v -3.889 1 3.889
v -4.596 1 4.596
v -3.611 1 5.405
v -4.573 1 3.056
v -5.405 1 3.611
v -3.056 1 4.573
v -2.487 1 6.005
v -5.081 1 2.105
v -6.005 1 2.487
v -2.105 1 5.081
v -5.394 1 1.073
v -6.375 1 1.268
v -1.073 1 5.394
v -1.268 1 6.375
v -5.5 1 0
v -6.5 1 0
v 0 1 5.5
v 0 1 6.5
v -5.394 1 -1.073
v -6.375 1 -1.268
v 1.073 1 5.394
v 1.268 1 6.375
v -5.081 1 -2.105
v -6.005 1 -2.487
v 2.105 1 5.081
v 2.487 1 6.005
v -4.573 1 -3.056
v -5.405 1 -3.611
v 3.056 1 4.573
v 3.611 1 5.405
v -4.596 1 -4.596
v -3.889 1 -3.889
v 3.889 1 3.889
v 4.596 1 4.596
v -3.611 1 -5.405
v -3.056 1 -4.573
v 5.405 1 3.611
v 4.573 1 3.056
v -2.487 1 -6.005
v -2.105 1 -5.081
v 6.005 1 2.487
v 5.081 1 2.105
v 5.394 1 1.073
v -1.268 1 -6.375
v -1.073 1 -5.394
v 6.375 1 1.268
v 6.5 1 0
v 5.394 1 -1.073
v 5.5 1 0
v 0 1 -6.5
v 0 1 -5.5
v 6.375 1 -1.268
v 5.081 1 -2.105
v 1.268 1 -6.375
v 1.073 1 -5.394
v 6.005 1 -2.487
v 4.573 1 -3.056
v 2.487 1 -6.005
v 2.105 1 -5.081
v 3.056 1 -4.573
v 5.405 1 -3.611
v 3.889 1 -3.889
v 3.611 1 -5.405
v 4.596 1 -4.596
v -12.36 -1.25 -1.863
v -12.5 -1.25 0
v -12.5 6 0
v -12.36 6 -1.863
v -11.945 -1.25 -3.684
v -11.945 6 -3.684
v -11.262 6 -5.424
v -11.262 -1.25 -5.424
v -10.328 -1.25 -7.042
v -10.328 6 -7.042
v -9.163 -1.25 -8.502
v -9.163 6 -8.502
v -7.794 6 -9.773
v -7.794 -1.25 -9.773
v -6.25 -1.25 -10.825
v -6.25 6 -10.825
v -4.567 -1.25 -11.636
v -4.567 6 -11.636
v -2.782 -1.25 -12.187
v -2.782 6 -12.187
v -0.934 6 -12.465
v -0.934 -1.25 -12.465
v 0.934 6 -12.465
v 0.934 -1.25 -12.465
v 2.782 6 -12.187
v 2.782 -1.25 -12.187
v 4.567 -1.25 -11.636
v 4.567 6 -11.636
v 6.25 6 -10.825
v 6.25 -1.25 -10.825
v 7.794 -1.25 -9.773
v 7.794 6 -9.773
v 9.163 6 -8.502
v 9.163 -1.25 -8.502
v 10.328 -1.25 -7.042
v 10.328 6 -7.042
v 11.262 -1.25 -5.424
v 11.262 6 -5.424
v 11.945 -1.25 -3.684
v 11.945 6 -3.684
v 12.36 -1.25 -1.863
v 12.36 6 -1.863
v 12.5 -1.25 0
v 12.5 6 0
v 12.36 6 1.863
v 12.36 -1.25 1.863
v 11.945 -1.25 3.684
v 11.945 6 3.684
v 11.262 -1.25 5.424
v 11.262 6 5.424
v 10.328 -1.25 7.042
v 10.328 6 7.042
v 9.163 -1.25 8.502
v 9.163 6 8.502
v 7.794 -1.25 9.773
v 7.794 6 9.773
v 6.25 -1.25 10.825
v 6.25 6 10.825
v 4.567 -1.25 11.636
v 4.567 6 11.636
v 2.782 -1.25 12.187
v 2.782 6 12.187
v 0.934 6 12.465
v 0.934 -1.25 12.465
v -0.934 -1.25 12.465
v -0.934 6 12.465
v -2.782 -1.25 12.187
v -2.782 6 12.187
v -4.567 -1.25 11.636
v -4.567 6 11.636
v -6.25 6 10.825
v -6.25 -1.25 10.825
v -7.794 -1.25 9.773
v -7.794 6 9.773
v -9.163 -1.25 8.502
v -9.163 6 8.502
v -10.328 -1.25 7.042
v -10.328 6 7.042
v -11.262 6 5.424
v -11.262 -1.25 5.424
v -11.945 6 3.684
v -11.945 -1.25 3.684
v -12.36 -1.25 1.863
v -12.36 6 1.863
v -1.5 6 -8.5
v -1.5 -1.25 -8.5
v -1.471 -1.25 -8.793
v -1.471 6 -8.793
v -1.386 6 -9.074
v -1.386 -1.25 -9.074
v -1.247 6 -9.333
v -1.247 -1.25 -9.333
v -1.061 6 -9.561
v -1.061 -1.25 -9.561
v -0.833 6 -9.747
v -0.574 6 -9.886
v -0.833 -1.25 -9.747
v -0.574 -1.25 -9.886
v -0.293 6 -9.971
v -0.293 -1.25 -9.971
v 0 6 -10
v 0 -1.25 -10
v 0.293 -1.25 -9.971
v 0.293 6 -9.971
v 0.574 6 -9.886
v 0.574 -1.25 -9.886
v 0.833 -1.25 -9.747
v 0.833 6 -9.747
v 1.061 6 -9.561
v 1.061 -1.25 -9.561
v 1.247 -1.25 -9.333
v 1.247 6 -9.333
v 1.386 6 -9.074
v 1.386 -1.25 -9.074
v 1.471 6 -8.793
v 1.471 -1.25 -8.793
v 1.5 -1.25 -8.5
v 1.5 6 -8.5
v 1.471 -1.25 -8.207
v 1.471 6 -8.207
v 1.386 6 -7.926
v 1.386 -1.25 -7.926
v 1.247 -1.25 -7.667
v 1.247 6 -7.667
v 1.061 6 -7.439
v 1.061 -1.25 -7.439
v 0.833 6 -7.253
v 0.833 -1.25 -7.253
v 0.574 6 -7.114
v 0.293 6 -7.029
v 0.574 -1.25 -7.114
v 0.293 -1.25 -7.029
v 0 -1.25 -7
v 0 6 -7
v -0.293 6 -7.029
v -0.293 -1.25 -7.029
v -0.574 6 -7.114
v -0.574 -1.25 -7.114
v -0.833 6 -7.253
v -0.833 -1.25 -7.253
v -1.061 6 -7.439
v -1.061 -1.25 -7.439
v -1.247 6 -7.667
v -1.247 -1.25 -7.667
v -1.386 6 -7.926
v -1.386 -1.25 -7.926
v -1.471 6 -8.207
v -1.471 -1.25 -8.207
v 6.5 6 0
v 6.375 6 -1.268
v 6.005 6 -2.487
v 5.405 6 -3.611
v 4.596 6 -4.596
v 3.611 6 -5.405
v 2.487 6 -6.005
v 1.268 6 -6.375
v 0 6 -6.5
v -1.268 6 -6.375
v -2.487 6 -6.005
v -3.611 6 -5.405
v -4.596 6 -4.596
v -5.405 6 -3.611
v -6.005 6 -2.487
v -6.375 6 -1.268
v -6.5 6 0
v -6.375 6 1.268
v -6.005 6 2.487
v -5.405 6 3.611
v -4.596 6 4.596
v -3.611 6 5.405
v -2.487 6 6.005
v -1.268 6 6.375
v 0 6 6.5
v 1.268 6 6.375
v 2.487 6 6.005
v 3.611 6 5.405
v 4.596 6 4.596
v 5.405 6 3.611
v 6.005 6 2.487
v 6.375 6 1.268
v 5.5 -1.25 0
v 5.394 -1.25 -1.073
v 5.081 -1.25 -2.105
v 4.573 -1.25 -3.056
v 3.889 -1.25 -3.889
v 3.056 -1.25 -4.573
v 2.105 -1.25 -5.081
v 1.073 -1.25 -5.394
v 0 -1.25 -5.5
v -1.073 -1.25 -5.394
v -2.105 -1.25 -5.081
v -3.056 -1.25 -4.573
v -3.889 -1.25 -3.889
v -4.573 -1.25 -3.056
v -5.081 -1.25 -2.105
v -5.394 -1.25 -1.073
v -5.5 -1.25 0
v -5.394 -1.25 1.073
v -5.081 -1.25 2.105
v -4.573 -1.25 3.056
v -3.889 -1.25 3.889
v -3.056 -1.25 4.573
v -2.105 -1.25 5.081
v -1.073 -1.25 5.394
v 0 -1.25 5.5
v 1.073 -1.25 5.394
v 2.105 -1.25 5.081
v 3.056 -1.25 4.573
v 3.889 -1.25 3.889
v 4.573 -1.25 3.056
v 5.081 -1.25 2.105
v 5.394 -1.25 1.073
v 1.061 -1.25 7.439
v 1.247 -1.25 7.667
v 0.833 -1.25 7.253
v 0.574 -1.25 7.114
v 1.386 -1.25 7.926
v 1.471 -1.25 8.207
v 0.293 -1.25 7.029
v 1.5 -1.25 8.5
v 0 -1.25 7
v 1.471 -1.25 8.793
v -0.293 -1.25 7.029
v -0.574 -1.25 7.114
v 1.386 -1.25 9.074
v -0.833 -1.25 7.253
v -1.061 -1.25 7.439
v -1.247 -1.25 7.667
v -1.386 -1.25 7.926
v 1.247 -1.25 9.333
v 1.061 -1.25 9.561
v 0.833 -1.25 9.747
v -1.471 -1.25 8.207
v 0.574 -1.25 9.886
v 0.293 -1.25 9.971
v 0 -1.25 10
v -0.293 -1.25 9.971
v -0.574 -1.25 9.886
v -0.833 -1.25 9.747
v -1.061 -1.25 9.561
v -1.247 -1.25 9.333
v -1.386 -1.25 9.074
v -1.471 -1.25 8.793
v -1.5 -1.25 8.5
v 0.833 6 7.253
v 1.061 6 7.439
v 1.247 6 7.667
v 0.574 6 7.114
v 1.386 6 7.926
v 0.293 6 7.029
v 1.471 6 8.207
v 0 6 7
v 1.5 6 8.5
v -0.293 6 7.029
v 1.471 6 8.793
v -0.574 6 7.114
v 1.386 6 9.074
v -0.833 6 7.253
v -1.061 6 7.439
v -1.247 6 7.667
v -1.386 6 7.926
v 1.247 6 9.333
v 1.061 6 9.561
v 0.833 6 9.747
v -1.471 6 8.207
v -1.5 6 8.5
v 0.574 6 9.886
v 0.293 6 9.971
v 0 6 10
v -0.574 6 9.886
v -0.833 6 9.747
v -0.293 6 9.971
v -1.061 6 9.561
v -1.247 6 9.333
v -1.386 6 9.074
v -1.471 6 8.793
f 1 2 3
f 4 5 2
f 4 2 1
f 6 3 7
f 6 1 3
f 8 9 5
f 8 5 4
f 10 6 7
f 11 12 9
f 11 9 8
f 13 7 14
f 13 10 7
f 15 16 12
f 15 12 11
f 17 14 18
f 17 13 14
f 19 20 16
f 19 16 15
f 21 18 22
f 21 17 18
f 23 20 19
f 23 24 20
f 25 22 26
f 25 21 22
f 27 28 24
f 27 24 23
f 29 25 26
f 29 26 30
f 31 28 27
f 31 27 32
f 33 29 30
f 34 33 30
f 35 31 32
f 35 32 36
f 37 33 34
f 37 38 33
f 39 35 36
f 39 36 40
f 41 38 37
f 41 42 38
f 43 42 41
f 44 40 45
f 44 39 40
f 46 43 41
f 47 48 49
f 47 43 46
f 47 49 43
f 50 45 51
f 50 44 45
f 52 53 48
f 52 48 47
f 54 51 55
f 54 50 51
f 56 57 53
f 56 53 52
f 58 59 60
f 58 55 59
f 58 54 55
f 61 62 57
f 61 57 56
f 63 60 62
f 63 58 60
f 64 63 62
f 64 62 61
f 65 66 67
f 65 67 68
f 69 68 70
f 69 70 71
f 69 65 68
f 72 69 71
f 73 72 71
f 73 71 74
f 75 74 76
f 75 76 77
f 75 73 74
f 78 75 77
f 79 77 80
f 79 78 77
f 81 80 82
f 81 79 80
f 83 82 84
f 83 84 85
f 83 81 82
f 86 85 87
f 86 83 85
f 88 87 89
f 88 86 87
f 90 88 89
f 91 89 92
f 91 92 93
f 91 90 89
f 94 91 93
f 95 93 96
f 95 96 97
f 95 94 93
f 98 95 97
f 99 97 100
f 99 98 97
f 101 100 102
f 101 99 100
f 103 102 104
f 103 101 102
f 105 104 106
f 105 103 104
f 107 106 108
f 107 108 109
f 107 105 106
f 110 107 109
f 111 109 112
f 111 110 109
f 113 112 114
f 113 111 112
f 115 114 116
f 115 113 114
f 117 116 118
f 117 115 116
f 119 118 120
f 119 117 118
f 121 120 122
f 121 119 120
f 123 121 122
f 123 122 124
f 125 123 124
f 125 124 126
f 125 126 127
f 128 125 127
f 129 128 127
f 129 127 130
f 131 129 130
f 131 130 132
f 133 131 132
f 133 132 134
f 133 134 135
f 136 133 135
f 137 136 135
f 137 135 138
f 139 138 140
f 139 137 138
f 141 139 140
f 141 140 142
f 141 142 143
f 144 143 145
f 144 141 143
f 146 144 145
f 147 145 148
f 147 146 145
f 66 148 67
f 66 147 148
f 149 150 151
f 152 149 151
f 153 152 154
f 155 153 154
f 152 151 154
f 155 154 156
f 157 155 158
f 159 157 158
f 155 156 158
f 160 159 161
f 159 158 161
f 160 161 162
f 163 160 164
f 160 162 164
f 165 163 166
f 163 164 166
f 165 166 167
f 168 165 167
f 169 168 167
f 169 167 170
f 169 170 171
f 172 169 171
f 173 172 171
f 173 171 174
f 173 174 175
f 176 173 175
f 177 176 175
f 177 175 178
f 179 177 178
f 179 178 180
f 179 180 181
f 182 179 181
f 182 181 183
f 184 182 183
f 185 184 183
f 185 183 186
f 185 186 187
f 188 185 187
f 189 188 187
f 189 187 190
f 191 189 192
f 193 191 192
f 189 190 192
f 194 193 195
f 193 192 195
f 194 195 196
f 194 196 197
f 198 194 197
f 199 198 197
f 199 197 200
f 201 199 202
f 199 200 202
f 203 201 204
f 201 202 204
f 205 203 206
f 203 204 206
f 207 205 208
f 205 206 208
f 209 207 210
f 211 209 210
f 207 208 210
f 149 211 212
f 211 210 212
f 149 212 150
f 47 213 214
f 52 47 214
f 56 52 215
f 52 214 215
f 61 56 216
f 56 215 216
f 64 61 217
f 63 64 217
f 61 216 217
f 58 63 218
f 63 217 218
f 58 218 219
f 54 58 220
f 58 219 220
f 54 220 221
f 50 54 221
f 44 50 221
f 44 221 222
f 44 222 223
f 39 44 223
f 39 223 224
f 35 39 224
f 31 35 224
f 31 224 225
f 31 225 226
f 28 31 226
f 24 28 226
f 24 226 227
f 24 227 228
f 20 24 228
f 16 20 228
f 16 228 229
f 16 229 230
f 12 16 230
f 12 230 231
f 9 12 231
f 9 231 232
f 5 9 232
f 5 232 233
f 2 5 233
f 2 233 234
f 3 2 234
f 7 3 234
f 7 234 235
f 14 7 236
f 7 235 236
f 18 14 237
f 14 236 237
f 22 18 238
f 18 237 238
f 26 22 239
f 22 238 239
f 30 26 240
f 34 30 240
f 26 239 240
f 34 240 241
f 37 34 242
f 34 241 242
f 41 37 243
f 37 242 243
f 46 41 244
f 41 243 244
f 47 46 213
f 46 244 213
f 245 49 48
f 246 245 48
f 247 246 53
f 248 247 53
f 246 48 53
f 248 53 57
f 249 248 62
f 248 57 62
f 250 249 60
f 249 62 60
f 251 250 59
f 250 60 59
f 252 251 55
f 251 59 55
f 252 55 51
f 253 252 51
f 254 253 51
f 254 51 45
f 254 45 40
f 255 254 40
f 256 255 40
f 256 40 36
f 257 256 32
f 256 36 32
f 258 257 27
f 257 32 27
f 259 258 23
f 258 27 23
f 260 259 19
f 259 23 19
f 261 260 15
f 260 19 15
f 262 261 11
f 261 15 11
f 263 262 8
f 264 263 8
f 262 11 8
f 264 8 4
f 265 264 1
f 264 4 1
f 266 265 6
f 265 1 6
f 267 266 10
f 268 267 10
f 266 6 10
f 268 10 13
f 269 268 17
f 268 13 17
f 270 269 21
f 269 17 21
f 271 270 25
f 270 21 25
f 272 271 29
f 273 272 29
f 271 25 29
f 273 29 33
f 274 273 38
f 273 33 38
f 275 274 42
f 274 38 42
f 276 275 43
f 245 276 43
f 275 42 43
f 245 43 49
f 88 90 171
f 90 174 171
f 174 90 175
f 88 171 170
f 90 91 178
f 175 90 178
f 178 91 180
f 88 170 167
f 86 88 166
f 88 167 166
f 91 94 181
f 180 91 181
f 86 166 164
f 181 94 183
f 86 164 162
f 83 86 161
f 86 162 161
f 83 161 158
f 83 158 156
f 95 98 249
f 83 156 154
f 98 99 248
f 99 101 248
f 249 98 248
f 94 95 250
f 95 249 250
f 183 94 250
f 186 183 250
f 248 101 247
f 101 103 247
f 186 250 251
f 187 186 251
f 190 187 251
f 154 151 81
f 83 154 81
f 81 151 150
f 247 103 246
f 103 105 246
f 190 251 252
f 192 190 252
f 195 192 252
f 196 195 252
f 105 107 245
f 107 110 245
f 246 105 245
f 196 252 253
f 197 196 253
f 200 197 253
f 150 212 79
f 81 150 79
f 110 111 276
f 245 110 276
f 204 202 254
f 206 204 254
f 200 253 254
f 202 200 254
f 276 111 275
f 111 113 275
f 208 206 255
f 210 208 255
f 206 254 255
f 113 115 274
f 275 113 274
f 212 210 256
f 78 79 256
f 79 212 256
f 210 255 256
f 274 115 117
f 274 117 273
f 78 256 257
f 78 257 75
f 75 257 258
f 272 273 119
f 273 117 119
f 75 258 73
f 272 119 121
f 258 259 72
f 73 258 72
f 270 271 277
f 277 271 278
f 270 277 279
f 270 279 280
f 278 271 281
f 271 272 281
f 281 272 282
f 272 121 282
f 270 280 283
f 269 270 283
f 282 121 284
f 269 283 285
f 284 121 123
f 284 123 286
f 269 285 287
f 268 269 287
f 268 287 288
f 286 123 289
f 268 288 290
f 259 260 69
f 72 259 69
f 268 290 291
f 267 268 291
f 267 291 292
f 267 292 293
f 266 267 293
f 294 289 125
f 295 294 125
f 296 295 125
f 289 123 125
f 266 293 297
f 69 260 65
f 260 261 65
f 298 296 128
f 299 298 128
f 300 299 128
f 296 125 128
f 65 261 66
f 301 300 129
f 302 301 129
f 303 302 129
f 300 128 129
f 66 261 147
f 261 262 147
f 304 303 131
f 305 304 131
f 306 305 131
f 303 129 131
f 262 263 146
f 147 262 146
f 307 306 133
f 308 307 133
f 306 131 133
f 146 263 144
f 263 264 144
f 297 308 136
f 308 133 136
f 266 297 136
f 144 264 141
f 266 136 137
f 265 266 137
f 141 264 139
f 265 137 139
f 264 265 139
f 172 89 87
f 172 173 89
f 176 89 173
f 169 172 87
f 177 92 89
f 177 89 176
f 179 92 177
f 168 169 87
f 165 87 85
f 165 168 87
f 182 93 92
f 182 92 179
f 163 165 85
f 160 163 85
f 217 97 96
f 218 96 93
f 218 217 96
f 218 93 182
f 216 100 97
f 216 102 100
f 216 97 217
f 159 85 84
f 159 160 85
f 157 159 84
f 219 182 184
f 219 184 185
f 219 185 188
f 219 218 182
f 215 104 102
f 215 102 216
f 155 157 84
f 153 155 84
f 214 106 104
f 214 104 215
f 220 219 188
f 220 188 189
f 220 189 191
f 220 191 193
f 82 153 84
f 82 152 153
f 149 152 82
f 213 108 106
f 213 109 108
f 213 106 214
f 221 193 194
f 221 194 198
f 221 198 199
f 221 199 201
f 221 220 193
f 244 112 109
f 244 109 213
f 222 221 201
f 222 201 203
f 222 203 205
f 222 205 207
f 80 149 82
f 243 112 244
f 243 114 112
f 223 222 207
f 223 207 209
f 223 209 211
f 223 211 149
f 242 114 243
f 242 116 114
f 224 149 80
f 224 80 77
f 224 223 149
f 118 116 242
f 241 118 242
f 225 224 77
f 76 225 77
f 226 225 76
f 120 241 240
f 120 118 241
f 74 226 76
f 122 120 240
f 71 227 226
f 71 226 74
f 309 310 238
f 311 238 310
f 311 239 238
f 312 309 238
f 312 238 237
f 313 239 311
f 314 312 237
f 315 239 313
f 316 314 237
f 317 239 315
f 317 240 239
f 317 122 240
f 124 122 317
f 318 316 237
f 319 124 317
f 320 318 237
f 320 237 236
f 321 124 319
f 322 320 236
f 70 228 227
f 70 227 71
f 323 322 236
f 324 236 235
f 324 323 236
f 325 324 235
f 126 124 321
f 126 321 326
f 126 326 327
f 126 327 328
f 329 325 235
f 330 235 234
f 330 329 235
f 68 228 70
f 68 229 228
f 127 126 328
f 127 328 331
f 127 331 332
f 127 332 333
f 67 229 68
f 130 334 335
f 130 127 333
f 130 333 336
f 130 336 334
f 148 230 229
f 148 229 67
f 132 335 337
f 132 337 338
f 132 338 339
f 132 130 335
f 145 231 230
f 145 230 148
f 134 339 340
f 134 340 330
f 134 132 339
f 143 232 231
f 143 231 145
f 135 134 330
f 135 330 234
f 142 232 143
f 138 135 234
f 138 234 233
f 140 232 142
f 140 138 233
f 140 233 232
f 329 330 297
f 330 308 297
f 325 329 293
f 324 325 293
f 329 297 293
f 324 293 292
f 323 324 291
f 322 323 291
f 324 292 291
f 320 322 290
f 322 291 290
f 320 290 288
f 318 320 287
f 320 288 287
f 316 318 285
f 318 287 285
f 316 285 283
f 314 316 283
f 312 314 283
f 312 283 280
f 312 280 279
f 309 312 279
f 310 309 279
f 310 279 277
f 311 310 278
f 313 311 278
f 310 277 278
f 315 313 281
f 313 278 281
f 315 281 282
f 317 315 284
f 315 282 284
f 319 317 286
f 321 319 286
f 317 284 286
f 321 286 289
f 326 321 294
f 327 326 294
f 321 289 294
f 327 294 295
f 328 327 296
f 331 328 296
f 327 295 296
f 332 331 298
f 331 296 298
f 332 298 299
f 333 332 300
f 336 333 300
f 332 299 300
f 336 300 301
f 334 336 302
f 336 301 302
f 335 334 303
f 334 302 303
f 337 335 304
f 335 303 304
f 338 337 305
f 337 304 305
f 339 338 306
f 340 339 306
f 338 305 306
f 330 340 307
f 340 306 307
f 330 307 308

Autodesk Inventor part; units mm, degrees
ref_plane "YZ Plane" through (0, 0, 0) normal (1, 0, 0) x (0, 1, 0)
ref_plane "XZ Plane" through (0, 0, 0) normal (0, 1, 0) x (-1, 0, 0)
ref_plane "XY Plane" through (0, 0, 0) normal (0, 0, 1) x (1, 0, 0)
sketch "草圖1" plane through (0, 0, 0) normal (0, 1, 0) x (-1, 0, 0)
  circle A0 centre (0, 0) radius 12.5
  circle A1 centre (0, 8.5) radius 1.5
  circle A2 centre (0, -8.5) radius 1.5
  dimension "d0" = 25
  dimension "d1" = 17
  dimension "d2" = 8.5
  dimension "d3" = 3
  dimension "d4" = 3
extrude "擠出1" add sketch "草圖1" along normal blind 6
sketch "草圖2" plane through (0, 6, 0) normal (0, 1, 0) x (1, 0, 0)
  circle A0 centre (0, 0) radius 5.5
  dimension "d7" = 11
extrude "擠出2" cut sketch "草圖2" against normal through all
sketch "草圖3" plane through (0, 6, 0) normal (0, 1, 0) x (1, 0, 0)
  circle A0 centre (0, 0) radius 6.5
  dimension "d10" = 13
extrude "擠出3" cut sketch "草圖3" against normal blind 5
move faces "移動1" translate (0, -1.25, 0) faces at (3.8939, 0, -7.6516)
properties part number "wheel_base_cover"
